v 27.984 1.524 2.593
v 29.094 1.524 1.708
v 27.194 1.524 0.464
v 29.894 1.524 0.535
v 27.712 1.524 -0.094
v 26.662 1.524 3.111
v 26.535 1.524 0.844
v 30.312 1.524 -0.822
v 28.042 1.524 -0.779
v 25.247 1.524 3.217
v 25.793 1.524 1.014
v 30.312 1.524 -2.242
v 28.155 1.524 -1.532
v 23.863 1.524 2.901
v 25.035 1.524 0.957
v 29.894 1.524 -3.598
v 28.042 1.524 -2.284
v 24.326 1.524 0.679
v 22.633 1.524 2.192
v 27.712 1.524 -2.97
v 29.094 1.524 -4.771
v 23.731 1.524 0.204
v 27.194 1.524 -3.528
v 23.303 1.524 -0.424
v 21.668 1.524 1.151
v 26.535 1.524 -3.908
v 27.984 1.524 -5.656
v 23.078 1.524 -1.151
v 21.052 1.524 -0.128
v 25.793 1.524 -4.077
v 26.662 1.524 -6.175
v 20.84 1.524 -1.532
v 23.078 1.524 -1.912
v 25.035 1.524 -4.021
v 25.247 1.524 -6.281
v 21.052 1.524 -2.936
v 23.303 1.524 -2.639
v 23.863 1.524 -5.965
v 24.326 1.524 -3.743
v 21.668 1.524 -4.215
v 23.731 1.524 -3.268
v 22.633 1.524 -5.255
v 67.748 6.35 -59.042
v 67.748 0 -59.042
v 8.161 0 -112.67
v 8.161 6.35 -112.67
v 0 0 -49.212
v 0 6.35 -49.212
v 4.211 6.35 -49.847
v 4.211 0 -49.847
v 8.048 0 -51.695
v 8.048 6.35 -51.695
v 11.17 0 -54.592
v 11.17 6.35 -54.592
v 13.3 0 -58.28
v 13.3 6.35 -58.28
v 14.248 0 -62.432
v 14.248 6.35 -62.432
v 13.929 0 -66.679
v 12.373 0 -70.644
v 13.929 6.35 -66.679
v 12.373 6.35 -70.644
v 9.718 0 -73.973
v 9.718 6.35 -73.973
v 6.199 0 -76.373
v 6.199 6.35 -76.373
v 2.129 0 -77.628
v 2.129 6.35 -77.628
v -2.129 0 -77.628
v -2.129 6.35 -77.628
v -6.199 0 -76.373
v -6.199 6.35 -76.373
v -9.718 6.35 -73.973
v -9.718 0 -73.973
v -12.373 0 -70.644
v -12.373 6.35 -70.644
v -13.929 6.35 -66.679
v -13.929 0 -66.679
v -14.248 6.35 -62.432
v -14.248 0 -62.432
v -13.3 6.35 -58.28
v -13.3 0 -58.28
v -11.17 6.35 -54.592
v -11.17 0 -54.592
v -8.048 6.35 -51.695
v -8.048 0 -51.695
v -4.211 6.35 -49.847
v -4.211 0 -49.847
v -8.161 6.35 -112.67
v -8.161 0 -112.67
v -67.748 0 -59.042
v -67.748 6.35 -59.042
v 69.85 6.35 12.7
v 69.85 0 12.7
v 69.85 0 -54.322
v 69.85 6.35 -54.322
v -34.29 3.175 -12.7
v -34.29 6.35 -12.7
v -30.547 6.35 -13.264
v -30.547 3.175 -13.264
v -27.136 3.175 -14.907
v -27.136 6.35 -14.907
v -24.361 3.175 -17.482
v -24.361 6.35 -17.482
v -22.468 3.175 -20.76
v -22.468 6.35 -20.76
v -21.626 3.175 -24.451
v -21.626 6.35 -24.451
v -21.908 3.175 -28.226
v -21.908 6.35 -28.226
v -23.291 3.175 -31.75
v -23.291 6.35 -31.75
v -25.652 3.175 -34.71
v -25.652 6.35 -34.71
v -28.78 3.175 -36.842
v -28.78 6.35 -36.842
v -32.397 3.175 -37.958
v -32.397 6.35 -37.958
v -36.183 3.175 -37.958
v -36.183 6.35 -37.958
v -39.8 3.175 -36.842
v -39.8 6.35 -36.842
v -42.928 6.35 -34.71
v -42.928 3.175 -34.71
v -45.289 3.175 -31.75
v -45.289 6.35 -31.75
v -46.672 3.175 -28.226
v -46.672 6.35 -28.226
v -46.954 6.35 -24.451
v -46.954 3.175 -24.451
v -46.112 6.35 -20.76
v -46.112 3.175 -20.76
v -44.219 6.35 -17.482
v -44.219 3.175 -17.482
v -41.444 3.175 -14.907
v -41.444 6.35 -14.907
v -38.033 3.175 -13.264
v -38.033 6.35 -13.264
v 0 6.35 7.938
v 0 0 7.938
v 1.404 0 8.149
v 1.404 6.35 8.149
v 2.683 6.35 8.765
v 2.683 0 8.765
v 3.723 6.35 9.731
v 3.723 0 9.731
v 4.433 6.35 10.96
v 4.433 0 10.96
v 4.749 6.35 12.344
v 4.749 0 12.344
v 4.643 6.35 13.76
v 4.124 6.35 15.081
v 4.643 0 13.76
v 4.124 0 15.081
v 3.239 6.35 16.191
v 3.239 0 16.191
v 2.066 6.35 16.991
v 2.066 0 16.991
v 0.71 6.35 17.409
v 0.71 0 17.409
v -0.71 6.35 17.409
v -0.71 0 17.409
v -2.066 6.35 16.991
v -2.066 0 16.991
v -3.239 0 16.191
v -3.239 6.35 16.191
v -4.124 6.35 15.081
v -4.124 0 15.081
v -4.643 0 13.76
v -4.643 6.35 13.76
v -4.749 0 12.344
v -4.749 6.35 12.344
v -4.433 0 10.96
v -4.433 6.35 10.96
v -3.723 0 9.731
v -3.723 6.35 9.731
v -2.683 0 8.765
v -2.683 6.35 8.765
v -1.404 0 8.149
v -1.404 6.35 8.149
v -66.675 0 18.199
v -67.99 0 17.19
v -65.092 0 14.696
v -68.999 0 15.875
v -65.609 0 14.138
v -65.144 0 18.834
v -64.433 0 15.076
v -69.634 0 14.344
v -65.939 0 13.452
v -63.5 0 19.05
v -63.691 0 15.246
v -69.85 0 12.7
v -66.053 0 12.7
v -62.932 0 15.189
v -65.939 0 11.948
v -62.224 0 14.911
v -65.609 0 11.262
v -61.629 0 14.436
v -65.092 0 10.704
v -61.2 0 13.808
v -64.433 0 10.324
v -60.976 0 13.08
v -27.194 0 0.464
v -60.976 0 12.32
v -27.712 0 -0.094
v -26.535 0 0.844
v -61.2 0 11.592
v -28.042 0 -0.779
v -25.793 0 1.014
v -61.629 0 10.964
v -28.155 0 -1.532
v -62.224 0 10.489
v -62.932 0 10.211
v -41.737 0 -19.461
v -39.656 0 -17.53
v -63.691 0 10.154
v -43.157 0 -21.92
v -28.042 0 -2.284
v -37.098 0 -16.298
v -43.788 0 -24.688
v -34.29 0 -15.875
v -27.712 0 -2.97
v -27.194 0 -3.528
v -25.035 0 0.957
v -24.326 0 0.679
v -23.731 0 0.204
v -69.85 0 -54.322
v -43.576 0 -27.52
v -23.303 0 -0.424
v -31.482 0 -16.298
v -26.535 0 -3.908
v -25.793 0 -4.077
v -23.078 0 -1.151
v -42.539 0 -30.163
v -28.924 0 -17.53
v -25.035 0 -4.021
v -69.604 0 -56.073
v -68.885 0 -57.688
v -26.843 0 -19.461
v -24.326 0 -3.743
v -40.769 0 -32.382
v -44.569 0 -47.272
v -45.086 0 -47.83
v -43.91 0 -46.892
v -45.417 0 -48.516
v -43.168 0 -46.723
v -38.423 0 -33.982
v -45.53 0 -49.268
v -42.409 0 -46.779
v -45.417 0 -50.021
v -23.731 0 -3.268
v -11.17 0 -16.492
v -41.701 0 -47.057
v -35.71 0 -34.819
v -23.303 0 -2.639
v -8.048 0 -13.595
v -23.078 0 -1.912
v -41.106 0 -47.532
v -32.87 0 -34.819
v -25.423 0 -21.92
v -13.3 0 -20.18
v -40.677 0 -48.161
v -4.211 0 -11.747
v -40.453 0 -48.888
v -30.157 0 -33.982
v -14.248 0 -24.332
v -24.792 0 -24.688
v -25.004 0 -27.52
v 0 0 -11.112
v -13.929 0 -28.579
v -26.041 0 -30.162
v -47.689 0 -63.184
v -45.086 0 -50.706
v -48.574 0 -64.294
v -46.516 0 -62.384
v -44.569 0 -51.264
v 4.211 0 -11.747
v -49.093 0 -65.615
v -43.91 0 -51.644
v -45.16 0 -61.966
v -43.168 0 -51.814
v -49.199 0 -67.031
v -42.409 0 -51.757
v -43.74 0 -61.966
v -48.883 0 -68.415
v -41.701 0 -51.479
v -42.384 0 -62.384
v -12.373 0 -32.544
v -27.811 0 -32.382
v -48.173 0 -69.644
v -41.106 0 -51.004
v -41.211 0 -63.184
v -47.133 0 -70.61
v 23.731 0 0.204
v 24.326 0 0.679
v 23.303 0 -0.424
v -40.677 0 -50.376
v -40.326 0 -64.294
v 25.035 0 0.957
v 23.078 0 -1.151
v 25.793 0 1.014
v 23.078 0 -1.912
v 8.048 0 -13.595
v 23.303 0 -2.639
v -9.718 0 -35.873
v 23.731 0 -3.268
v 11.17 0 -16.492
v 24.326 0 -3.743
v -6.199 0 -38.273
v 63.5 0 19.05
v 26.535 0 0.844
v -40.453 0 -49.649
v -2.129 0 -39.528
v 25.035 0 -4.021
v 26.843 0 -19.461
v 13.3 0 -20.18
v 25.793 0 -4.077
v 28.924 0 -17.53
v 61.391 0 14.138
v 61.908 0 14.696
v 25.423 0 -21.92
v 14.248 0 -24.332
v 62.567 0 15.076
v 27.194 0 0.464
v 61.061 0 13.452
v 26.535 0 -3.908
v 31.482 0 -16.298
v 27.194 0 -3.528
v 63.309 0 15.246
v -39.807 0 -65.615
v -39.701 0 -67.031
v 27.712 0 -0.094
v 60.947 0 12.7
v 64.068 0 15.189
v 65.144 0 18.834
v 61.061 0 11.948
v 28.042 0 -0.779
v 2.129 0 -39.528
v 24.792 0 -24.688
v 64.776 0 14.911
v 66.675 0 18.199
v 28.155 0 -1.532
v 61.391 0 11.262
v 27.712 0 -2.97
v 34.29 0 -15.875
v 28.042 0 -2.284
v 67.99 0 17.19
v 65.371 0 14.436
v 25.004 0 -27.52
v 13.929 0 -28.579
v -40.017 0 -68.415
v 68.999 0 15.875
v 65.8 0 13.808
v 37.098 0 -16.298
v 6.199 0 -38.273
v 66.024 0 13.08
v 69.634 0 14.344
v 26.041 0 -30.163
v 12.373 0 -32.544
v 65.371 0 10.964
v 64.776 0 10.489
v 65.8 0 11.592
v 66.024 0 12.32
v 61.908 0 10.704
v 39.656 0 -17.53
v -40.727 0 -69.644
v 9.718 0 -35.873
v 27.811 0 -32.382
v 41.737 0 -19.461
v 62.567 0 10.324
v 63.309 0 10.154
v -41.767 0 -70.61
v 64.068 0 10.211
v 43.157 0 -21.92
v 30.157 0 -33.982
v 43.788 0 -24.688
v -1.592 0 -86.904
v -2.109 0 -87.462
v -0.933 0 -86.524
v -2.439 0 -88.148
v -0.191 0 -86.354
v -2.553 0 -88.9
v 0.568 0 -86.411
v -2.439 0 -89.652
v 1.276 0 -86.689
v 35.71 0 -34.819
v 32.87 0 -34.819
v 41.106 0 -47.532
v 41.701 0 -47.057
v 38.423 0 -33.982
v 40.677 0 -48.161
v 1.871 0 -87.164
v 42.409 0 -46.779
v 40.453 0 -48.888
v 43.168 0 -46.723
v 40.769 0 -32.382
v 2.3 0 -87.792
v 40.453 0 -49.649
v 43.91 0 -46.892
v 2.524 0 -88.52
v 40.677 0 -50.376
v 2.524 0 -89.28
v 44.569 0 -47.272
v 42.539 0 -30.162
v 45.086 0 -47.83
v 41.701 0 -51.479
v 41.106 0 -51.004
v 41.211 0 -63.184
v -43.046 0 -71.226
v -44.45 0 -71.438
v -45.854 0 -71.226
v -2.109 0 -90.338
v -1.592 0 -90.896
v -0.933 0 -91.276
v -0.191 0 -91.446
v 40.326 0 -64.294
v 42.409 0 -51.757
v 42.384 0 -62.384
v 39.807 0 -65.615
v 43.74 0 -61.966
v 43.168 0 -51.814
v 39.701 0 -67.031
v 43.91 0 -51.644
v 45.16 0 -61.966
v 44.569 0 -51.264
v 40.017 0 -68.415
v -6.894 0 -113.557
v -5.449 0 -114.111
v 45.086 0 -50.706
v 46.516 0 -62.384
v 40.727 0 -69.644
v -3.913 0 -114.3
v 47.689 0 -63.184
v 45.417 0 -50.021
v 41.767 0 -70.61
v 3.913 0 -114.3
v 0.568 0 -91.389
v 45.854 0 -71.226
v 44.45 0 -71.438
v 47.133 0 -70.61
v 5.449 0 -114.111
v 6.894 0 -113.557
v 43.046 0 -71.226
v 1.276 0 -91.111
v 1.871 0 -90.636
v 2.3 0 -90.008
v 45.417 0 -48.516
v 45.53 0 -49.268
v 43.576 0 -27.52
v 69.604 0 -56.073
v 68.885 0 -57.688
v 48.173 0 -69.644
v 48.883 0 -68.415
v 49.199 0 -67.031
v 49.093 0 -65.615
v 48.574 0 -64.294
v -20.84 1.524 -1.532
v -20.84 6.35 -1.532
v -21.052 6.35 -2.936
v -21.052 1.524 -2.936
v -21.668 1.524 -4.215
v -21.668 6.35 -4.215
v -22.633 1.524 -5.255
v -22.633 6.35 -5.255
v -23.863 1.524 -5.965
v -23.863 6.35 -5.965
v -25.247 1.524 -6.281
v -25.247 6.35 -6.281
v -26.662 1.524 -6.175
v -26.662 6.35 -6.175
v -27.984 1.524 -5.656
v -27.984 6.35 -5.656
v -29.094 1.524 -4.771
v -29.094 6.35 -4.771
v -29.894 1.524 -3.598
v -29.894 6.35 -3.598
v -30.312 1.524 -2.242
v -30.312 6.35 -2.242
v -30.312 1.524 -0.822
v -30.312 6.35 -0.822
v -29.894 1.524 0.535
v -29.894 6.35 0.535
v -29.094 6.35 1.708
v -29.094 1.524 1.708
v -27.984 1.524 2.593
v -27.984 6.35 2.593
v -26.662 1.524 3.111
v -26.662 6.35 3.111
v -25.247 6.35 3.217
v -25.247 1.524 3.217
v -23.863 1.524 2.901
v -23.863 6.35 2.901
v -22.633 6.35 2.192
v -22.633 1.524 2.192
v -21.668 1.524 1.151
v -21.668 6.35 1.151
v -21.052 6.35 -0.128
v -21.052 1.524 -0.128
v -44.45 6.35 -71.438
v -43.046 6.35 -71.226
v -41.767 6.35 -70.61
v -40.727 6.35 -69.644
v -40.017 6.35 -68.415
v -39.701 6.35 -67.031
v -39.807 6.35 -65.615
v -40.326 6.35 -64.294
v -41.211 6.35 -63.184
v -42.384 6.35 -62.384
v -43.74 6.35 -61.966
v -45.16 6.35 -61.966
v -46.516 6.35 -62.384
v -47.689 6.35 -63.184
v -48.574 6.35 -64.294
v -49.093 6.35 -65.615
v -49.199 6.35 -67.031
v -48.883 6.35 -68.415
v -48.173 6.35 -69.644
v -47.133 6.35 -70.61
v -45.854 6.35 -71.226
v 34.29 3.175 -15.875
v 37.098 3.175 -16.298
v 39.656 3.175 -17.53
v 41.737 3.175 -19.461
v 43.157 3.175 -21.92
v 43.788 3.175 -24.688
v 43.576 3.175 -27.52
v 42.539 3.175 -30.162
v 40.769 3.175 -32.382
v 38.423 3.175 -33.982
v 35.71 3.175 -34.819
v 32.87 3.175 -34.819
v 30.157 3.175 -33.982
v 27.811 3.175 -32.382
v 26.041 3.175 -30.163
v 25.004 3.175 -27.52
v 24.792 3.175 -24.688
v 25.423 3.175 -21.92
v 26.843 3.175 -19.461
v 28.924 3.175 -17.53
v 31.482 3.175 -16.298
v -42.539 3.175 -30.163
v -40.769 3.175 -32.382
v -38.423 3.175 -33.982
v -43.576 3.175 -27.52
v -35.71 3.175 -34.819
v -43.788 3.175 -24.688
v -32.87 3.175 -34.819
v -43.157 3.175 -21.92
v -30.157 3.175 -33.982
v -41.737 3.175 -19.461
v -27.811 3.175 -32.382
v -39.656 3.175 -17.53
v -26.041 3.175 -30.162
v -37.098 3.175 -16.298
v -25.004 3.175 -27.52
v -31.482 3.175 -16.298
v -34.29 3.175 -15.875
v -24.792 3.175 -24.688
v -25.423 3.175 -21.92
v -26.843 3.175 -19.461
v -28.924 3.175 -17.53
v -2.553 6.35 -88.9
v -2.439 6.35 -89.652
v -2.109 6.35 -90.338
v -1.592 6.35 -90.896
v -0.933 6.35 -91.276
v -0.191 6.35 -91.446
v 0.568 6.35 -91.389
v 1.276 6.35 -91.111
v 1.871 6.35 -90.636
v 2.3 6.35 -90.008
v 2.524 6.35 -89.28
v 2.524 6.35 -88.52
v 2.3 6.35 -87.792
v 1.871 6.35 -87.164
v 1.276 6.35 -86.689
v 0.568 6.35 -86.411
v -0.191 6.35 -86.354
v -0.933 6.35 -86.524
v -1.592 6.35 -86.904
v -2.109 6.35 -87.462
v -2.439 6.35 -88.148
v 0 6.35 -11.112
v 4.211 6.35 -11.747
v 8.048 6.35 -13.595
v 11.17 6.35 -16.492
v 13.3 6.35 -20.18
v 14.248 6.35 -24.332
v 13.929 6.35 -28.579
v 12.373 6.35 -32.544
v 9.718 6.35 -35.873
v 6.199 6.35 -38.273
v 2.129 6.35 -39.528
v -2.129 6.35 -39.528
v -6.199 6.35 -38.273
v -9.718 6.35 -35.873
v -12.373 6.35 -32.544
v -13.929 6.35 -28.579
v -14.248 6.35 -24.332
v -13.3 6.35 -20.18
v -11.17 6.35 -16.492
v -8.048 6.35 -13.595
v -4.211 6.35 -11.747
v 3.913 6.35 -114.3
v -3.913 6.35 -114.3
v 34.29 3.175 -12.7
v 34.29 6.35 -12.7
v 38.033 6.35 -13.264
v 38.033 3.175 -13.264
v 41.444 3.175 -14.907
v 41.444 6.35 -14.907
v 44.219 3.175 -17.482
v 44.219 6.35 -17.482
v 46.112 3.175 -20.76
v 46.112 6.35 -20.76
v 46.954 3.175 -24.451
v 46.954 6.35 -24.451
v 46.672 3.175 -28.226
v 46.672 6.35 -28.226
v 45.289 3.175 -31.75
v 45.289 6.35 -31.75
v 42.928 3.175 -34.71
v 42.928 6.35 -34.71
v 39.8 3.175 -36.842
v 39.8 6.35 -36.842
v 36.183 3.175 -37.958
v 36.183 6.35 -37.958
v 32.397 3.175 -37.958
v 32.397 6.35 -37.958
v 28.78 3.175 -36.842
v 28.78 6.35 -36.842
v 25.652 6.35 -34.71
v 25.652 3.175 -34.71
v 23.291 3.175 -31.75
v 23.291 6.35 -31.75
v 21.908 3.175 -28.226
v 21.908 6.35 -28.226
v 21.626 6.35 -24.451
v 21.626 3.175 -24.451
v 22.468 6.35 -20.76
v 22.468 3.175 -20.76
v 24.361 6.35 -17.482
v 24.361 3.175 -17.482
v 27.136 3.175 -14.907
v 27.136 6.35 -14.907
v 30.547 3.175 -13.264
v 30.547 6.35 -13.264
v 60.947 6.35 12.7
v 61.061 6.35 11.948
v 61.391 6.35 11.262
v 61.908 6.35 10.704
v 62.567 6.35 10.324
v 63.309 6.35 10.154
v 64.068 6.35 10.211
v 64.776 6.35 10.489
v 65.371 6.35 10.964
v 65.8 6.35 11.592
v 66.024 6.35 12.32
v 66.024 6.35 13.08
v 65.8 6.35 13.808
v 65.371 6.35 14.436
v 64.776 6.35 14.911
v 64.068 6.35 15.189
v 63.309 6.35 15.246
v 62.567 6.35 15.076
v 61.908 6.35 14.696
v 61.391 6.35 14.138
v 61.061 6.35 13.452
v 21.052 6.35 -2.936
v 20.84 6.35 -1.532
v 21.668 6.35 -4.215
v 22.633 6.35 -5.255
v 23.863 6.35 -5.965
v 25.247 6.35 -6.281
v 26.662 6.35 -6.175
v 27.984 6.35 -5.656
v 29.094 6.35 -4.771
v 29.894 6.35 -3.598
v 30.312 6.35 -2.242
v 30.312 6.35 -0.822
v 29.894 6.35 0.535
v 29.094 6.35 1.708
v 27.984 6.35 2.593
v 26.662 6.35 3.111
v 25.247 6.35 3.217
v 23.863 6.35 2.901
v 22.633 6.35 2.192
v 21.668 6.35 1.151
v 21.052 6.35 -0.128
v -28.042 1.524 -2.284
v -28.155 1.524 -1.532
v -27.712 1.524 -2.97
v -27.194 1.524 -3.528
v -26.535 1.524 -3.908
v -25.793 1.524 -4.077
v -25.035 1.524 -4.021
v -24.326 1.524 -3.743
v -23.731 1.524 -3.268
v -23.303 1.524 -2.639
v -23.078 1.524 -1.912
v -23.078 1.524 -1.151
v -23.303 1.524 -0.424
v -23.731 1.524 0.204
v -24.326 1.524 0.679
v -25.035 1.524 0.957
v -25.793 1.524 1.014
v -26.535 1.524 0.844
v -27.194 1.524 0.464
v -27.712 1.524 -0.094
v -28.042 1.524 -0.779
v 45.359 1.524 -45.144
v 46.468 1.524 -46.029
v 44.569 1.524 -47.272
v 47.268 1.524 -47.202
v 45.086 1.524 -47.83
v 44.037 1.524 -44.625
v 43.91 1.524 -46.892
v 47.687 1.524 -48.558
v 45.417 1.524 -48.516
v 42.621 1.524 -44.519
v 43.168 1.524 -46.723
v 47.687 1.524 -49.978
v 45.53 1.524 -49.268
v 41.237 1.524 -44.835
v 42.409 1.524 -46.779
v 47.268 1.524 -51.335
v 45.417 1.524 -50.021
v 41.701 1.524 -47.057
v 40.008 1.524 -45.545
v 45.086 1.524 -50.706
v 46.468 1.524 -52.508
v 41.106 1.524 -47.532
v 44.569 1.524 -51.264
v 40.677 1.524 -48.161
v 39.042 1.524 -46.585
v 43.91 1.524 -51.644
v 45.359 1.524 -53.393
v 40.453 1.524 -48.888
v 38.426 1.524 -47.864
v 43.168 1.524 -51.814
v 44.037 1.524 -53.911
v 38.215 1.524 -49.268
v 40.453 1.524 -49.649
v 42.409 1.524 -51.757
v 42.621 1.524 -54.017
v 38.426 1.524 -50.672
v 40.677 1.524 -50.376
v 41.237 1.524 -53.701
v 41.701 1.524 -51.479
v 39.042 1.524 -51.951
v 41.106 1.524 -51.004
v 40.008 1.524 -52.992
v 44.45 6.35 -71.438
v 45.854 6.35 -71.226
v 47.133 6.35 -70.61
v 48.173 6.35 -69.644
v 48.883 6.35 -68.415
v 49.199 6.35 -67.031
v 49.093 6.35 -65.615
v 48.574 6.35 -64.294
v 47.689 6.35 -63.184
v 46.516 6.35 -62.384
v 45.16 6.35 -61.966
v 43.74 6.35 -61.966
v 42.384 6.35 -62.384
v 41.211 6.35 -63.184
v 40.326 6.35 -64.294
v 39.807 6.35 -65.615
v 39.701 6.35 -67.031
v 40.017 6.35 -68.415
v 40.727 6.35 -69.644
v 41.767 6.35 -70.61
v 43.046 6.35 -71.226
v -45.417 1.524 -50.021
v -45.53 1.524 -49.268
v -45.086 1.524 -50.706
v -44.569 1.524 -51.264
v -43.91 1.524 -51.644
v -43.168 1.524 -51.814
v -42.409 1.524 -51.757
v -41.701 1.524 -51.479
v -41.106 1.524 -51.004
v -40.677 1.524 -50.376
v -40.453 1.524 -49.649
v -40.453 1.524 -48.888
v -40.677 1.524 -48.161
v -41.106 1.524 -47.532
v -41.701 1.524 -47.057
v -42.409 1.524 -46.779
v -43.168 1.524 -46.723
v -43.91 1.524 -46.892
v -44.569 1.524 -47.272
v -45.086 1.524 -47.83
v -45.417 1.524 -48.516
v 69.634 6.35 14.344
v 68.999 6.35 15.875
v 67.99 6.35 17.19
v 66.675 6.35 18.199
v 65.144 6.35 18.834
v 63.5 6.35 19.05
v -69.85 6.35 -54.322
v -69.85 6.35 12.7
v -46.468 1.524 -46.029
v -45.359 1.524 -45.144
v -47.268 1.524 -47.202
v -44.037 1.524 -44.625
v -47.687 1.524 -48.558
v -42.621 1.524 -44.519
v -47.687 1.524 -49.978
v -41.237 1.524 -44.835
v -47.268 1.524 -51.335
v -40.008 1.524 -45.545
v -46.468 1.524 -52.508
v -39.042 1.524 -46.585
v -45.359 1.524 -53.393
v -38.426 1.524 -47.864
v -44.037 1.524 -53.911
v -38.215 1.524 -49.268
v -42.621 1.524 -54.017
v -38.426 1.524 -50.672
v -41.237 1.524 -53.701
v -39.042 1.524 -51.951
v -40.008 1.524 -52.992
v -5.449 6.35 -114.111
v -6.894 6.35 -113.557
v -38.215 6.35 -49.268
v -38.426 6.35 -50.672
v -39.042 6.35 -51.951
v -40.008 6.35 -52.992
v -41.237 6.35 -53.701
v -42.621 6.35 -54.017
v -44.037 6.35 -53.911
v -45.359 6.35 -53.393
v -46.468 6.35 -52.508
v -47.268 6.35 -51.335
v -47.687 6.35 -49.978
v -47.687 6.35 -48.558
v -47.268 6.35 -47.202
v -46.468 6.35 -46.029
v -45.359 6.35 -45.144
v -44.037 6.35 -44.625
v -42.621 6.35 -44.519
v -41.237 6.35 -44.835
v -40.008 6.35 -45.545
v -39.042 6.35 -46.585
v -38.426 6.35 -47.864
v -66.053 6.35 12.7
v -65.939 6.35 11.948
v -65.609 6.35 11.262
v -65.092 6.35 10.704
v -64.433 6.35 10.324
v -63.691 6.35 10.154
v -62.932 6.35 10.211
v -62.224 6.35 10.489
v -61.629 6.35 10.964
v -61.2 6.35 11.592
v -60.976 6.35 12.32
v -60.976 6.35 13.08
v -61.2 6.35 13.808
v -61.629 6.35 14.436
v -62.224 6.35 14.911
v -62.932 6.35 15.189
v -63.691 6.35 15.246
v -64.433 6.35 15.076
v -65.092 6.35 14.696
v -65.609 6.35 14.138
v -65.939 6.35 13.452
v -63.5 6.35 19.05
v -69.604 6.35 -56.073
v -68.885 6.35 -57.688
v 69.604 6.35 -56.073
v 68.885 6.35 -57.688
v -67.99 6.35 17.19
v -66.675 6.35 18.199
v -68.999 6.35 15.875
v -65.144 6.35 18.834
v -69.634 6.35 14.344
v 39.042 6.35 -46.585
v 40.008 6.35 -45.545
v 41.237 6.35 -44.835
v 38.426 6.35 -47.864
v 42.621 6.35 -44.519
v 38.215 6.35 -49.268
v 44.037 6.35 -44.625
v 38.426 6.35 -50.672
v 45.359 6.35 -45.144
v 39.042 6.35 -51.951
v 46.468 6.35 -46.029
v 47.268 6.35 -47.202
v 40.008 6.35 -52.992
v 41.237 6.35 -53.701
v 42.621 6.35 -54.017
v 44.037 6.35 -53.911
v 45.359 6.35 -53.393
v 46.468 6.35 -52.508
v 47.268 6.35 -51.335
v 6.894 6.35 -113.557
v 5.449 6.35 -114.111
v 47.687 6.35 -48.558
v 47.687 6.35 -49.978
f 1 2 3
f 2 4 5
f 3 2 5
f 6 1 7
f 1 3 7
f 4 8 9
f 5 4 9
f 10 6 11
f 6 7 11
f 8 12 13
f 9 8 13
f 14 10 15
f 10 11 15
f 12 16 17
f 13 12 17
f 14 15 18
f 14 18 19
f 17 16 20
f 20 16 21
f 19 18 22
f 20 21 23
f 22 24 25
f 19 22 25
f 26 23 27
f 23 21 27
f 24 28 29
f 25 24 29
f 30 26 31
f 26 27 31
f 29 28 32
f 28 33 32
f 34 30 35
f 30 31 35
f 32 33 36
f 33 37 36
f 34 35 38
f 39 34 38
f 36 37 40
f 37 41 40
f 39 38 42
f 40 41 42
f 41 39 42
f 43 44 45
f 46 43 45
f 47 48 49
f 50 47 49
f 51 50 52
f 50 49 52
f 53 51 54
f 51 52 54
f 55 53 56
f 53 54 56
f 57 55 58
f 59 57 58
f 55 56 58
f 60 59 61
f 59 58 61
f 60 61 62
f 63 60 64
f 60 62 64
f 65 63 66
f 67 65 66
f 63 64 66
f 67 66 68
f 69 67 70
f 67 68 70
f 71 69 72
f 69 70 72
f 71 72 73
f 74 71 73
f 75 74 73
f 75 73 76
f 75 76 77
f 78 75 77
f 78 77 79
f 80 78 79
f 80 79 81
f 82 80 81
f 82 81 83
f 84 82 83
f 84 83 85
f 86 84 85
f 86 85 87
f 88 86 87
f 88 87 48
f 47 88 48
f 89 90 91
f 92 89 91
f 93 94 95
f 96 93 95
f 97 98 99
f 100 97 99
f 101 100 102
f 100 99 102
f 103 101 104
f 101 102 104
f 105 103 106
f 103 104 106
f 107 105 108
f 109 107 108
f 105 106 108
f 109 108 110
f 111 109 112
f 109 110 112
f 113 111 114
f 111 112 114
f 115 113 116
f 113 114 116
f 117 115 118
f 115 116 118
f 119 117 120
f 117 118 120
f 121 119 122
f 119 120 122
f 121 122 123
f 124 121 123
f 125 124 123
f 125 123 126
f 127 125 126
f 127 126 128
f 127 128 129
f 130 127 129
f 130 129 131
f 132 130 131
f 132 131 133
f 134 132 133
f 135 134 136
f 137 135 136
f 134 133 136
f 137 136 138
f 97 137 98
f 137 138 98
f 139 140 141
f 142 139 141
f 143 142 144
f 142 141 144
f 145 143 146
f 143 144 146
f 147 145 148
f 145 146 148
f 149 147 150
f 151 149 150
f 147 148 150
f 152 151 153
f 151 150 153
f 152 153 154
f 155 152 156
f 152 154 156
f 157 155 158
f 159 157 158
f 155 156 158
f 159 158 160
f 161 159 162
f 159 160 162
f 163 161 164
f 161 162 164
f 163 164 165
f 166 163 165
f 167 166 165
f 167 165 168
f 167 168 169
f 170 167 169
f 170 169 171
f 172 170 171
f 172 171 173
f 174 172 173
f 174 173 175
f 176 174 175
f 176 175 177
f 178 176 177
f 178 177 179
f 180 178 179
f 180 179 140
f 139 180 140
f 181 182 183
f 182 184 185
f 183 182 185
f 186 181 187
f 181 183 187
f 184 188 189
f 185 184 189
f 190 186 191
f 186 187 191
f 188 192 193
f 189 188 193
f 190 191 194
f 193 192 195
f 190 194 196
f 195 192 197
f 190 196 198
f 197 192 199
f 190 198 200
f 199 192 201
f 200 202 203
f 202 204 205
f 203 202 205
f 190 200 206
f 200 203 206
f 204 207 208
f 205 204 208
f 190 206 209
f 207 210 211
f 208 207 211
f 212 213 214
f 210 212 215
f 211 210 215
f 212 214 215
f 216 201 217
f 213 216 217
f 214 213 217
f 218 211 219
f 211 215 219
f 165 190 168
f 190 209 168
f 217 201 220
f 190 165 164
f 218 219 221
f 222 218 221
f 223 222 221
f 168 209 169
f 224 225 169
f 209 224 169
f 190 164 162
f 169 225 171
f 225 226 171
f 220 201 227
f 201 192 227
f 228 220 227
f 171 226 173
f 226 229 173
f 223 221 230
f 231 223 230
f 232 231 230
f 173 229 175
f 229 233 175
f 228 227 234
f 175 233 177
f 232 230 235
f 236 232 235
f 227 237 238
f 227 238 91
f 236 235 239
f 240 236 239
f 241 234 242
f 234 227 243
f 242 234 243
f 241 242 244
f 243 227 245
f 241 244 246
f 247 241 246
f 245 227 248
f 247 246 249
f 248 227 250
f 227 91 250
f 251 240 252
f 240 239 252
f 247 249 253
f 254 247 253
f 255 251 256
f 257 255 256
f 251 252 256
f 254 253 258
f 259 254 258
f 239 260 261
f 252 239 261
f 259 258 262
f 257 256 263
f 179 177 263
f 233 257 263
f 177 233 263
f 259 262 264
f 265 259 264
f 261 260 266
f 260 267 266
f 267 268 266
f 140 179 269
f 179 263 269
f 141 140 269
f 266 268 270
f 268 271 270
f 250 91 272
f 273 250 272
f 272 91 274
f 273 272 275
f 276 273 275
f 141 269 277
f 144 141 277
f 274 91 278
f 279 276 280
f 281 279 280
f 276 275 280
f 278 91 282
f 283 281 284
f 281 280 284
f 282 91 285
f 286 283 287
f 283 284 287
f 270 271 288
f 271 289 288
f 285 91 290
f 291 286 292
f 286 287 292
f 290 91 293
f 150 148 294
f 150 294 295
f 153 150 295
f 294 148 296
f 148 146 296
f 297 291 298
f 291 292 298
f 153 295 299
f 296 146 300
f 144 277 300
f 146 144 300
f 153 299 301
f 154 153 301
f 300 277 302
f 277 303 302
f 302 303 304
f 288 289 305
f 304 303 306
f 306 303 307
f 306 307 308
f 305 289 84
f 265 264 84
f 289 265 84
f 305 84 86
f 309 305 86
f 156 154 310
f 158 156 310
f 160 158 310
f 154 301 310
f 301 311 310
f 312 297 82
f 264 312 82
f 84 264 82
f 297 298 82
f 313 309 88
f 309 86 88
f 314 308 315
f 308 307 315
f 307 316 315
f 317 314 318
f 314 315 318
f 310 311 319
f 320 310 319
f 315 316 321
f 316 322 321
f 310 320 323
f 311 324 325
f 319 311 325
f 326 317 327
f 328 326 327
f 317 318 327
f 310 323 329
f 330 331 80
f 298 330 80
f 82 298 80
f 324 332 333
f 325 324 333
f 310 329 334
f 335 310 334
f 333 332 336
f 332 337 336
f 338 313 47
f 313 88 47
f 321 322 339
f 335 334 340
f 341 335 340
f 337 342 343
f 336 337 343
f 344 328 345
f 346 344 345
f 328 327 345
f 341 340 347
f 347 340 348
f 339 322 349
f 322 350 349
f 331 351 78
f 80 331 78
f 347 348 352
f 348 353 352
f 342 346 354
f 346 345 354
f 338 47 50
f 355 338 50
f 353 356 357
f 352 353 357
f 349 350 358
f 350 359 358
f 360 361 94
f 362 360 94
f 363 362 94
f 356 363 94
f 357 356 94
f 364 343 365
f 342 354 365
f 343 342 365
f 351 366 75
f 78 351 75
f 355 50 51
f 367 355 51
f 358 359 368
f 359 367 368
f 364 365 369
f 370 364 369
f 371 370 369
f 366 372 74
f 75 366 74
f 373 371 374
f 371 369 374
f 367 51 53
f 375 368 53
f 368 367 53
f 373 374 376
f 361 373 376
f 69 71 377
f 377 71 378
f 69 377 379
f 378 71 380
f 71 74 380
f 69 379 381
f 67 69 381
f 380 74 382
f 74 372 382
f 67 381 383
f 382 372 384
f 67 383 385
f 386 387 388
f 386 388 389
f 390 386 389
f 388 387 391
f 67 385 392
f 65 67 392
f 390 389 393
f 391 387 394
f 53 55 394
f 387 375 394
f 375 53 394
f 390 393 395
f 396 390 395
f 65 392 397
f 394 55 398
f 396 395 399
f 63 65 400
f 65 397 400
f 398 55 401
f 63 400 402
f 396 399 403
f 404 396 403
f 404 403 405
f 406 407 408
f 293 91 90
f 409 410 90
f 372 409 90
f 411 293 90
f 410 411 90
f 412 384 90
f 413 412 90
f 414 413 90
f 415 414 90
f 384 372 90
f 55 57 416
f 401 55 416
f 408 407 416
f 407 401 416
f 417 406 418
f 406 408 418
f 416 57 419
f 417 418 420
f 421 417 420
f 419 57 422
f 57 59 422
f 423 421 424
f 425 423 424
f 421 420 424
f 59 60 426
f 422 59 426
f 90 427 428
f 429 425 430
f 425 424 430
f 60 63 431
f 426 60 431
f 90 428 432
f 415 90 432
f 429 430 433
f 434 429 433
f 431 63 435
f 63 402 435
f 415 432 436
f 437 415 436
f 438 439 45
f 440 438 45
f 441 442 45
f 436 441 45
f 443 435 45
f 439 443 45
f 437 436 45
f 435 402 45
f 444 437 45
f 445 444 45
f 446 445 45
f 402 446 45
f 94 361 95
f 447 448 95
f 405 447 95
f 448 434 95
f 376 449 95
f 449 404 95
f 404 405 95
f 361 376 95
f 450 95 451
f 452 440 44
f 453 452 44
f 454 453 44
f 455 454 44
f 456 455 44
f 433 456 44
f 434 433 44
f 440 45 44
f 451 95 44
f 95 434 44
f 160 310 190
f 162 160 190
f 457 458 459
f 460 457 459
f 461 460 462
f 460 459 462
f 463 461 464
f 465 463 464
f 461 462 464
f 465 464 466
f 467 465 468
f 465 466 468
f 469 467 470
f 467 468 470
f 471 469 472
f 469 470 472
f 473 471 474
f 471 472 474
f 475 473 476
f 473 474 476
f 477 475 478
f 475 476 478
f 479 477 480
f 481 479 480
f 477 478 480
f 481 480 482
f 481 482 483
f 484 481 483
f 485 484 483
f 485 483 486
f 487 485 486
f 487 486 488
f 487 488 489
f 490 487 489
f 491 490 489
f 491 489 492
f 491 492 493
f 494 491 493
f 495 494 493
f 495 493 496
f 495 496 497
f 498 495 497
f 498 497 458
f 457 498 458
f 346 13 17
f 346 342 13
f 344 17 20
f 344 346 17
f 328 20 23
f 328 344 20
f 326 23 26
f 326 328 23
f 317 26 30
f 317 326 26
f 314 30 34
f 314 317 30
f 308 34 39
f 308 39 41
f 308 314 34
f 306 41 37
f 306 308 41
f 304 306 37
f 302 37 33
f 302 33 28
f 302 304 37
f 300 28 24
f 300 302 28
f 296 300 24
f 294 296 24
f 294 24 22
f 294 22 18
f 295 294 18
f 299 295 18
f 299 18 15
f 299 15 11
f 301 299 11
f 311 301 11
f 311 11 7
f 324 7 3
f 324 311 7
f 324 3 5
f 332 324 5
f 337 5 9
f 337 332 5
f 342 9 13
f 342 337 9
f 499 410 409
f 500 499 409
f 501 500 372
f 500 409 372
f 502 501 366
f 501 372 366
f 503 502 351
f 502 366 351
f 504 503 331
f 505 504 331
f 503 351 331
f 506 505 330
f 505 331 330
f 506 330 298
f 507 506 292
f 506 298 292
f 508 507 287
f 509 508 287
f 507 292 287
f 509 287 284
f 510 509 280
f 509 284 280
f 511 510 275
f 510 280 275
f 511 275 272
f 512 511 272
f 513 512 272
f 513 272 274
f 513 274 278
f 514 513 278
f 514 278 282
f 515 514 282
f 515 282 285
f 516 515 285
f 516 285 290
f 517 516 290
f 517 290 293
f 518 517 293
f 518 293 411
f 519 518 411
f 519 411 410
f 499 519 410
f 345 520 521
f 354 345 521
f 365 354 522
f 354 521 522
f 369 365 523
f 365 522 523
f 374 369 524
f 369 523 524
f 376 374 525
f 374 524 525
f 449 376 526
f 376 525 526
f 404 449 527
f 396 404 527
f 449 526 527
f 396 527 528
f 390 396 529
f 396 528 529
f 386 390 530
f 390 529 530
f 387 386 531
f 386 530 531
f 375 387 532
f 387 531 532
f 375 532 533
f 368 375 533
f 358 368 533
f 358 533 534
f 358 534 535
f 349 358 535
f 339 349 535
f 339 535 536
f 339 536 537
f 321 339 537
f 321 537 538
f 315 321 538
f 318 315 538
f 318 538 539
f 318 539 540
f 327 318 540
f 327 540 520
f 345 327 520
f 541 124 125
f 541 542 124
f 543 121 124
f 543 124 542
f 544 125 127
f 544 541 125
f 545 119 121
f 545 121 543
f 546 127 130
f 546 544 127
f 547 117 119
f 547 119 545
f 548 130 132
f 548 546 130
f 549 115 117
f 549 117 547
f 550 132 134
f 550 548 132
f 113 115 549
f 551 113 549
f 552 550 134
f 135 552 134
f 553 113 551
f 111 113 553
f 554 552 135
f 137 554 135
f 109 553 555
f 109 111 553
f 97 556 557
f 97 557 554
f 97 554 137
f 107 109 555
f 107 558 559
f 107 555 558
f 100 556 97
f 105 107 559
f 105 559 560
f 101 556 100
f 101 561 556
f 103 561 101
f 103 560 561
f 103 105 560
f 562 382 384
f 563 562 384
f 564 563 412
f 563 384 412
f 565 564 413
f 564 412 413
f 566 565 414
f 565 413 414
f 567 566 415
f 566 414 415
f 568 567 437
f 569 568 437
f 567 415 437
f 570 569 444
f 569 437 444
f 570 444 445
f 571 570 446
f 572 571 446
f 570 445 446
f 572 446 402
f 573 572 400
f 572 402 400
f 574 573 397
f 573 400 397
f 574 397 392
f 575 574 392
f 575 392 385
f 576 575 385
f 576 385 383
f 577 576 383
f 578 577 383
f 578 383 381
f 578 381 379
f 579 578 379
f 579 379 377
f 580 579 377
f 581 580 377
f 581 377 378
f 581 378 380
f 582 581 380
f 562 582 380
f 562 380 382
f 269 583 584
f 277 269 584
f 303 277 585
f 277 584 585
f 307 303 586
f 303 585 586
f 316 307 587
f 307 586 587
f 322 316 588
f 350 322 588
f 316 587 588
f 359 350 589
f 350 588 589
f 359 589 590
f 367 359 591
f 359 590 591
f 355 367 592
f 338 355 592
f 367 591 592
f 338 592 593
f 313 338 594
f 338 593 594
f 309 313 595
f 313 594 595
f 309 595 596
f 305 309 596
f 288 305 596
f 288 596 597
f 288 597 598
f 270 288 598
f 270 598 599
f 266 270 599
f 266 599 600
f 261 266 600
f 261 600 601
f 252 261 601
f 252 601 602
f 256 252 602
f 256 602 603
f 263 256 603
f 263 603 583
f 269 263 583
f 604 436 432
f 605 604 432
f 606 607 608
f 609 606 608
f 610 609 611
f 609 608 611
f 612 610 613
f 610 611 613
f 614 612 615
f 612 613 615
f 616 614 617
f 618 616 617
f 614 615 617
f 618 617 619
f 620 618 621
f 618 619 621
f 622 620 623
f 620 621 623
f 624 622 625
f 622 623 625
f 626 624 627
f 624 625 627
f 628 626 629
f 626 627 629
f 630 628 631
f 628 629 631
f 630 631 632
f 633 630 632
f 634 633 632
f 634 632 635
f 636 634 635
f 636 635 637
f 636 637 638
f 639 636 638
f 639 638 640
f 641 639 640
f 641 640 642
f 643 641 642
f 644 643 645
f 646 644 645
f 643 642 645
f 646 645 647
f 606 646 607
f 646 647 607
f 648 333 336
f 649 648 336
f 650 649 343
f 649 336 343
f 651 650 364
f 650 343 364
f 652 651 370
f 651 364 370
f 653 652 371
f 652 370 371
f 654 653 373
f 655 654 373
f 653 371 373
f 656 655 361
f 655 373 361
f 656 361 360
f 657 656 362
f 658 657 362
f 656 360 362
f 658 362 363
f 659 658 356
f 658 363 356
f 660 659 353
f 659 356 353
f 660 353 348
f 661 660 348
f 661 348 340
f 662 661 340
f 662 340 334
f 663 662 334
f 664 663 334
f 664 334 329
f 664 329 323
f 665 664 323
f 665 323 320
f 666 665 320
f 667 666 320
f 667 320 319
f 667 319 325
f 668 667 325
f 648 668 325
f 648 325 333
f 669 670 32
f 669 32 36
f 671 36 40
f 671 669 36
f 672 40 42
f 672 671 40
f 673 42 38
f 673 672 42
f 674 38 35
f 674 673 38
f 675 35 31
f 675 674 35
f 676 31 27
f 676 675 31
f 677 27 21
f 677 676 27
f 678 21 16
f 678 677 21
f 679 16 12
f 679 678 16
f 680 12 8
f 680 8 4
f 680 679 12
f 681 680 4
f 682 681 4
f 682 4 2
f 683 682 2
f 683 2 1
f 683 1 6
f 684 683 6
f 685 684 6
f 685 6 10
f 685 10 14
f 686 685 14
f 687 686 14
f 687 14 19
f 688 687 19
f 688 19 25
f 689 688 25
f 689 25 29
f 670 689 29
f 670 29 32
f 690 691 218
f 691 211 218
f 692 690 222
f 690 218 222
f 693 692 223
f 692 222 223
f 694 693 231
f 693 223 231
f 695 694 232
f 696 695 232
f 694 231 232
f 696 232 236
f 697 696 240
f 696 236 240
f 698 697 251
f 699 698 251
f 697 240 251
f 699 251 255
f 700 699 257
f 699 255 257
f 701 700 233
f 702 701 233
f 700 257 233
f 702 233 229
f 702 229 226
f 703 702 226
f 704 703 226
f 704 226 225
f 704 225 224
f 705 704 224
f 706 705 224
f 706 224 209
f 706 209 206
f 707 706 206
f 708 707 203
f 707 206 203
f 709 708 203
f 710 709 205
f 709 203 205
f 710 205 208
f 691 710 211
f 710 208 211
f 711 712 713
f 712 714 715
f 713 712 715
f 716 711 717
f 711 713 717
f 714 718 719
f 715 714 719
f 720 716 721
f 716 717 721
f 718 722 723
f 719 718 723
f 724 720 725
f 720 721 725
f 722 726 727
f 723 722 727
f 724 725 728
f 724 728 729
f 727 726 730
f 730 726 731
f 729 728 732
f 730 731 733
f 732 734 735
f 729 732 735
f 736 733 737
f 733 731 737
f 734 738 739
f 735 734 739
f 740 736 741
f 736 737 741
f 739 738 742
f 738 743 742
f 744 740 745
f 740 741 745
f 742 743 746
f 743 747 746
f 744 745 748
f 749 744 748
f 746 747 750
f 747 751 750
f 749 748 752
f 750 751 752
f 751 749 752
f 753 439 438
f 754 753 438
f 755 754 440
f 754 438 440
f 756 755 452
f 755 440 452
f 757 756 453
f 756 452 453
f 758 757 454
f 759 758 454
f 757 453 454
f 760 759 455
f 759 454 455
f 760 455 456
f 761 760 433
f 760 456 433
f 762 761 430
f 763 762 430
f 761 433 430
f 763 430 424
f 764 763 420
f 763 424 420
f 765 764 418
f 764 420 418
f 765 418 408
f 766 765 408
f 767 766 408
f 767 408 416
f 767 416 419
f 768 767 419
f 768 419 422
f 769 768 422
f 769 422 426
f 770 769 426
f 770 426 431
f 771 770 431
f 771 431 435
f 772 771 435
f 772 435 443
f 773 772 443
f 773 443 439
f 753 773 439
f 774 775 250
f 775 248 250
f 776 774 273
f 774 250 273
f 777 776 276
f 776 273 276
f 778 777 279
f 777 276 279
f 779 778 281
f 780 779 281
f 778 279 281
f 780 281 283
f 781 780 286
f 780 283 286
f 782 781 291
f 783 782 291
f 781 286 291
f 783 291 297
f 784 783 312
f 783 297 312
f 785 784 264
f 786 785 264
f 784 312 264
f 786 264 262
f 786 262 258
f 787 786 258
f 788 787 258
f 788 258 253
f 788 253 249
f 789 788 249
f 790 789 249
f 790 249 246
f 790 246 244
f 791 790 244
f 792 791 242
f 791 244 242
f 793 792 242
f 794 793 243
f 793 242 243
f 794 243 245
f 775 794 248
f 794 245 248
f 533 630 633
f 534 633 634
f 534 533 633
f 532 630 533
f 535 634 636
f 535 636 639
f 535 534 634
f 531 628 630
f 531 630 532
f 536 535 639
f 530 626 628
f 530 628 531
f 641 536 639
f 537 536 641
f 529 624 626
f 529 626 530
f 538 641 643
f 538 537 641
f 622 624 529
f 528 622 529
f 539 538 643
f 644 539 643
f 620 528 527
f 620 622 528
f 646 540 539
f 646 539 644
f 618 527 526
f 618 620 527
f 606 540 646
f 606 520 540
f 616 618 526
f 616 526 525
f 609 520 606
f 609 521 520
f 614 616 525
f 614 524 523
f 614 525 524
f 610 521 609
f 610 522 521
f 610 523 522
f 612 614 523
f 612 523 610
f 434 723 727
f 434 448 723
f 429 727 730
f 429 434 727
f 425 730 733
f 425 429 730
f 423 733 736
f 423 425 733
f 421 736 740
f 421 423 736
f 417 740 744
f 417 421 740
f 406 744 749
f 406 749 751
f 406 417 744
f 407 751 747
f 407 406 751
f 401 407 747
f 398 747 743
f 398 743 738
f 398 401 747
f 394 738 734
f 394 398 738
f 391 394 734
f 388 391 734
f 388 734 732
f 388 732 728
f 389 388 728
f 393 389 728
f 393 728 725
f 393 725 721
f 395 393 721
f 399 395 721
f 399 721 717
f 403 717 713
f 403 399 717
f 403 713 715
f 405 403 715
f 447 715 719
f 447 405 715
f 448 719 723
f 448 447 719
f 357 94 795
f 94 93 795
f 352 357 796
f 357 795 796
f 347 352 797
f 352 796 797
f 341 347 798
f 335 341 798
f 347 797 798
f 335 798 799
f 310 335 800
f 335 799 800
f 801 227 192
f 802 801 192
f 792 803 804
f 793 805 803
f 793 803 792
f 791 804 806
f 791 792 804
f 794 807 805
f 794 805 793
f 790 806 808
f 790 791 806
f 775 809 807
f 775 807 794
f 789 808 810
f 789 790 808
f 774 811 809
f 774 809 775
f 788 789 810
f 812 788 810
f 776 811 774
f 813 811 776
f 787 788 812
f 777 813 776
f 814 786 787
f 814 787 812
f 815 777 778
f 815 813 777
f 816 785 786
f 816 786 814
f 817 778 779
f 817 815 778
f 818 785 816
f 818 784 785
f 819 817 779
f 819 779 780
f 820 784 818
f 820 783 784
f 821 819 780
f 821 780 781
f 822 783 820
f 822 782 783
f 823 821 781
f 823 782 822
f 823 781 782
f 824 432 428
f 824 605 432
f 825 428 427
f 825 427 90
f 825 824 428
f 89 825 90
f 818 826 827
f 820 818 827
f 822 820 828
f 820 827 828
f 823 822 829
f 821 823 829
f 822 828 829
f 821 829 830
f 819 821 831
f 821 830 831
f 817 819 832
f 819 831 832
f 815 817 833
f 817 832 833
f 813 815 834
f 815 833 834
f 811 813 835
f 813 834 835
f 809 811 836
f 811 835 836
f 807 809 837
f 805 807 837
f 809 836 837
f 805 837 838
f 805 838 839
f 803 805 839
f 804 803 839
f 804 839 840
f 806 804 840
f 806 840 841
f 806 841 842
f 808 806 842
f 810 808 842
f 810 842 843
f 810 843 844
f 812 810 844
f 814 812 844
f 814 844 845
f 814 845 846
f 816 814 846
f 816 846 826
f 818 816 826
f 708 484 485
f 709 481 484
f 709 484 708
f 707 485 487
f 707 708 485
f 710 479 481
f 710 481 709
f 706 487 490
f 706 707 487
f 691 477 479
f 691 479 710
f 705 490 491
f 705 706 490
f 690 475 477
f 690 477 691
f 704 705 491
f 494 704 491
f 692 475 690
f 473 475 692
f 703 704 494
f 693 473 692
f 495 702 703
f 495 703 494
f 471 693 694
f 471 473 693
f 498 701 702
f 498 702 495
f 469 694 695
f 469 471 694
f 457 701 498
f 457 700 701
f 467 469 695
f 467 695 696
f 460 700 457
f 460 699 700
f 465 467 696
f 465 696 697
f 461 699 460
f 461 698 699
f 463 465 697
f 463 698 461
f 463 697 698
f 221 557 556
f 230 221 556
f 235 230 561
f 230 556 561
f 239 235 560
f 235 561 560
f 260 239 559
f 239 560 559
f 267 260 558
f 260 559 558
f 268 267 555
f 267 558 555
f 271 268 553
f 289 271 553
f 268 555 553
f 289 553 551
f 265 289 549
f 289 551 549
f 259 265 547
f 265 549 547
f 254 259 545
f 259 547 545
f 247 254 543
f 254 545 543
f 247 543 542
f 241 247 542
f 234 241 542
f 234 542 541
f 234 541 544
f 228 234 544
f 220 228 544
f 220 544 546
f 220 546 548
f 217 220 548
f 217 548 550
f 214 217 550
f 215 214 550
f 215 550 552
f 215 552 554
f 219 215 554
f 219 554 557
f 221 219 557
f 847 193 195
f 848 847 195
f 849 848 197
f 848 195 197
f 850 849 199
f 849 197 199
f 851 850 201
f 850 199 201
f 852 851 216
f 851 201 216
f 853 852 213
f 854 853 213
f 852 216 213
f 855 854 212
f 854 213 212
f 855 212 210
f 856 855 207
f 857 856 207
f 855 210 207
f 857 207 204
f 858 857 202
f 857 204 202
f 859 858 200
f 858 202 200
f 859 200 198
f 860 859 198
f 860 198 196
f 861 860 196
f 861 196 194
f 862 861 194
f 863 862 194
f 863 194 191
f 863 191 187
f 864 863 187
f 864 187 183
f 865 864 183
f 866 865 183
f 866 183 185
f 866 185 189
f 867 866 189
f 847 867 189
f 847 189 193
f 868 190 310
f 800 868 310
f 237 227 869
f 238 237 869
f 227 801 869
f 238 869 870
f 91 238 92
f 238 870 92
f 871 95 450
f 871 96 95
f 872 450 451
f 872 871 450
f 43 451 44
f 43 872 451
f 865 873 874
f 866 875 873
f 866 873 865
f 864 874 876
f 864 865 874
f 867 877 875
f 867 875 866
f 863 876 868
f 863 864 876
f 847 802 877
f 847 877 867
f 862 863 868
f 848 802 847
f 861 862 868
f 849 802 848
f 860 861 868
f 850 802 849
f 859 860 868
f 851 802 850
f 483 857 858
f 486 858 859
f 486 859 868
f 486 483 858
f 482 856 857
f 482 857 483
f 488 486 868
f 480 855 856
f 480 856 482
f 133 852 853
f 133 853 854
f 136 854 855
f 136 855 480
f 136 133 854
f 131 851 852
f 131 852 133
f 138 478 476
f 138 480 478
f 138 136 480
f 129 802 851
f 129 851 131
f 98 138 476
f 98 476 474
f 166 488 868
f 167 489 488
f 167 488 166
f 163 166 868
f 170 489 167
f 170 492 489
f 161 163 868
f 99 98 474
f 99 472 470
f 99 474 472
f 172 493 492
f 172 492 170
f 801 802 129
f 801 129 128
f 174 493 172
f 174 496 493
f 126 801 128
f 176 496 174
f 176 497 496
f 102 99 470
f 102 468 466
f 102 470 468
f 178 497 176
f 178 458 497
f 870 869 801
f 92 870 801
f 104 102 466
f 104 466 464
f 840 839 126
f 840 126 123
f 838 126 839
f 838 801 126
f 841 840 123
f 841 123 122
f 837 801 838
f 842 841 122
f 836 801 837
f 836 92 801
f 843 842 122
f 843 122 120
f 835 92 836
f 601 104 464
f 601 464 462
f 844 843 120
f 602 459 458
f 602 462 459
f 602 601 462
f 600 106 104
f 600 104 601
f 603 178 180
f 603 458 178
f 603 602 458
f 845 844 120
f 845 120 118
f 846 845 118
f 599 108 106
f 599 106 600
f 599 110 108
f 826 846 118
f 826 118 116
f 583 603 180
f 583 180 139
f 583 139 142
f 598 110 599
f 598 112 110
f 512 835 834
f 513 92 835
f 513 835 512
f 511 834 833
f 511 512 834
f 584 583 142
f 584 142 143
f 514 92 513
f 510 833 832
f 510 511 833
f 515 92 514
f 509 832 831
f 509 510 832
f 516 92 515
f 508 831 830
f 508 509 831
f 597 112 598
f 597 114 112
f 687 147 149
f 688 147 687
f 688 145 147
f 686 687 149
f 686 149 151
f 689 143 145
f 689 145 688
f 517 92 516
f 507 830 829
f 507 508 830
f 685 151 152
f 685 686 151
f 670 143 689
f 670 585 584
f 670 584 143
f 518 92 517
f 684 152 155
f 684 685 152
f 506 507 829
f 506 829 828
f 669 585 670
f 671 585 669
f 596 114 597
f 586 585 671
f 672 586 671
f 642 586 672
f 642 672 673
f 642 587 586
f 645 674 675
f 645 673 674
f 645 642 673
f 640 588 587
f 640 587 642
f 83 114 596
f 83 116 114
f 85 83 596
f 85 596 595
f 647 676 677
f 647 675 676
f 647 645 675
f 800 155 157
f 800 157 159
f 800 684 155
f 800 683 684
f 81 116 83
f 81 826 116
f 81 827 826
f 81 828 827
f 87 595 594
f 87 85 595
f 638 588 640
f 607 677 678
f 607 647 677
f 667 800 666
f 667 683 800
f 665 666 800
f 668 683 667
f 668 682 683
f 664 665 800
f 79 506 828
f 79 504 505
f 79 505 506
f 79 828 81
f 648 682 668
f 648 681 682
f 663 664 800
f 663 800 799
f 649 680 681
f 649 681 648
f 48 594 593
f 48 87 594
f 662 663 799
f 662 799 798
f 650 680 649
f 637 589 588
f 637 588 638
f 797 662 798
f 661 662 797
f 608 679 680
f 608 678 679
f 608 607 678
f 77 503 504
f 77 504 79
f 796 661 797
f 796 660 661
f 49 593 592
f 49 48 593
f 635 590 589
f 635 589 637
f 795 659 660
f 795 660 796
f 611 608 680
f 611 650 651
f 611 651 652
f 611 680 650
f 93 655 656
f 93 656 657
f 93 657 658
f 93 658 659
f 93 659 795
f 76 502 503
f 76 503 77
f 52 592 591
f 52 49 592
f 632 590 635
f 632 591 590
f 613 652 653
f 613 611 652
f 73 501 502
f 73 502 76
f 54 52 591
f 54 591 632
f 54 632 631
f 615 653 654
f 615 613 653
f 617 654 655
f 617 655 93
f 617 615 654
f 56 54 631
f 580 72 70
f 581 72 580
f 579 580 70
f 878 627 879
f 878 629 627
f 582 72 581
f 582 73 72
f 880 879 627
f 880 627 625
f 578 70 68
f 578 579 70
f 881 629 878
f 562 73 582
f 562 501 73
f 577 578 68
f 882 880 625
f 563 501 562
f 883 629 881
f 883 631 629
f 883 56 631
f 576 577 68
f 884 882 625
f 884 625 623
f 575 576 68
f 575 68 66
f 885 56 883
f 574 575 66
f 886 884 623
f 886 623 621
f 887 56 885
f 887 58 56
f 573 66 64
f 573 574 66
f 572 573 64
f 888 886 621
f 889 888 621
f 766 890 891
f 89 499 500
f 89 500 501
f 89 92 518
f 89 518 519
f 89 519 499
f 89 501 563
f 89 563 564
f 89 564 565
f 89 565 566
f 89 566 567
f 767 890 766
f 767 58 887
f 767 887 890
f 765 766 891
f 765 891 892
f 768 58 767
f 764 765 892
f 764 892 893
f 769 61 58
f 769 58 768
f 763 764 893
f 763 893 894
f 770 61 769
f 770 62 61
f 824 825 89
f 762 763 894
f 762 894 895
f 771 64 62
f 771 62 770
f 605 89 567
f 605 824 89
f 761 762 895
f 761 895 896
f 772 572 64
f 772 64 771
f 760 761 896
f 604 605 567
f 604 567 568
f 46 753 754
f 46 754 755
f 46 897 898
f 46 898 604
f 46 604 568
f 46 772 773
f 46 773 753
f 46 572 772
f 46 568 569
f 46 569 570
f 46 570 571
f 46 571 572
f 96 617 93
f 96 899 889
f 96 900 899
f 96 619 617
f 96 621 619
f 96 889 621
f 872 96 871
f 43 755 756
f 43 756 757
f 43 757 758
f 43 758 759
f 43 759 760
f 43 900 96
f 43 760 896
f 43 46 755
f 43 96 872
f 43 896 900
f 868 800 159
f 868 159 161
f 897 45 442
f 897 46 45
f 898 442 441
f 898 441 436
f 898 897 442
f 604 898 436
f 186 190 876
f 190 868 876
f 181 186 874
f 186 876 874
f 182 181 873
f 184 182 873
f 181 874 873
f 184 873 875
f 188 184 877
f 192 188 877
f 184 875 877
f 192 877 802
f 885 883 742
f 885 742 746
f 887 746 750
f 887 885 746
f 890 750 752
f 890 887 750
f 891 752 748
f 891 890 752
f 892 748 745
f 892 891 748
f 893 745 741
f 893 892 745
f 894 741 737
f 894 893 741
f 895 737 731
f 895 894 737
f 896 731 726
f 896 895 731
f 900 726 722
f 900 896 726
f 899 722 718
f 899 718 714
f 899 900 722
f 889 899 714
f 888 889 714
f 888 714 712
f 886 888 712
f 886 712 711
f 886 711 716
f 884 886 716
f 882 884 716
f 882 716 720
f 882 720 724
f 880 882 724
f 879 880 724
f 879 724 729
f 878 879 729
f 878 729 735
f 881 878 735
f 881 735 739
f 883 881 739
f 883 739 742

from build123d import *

# Parameters (mm, degrees)
BOSS_EXTRUDE1_DEPTH                             = 6.35
SKETCH2_R                                       = 9.525
MOTOR_SHAFT_HOLES_DEPTH                         = 135.10382172
SKETCH3_R                                       = 14.2875
FIRST_BEARING_HOLE_DEPTH                        = 135.10382172
SKETCH4_R                                       = 12.7
PINION_CLEARANCE_DEPTH                          = 3.175
SKETCH5_R                                       = 14.2875
CUT_EXTRUDE1_DEPTH                              = 135.10382172
CBORE_FOR_10_SOCKET_HEAD_CAP_SCREW1_D           = 5.1054
CBORE_FOR_10_SOCKET_HEAD_CAP_SCREW1_CBORE_D     = 9.525
CBORE_FOR_10_SOCKET_HEAD_CAP_SCREW1_CBORE_DEPTH = 4.826
F_10_CLEARANCE_HOLE1_D                          = 5.1054
FILLET1_R                                       = 6.35
SKETCH11_R                                      = 4.7625
CUT_EXTRUDE2_DEPTH                              = 50.8


with BuildPart() as part:
    # Sketch1 → Boss-Extrude1 (new body)
    with BuildSketch(Plane(origin=(0, 0, 0), x_dir=(1, 0, 0), z_dir=(0, 1, 0))):
        Polygon((69.85, -19.05), (69.85, 57.15), (6.35, 114.3), (-6.35, 114.3), (-69.85, 57.15), (-69.85, -19.05), align=None)
    extrude(amount=BOSS_EXTRUDE1_DEPTH)

    # Sketch2 → Motor Shaft Holes (cut, through all)
    with BuildSketch(Plane(origin=(0, 6.35, 0), x_dir=(1, 0, 0), z_dir=(0, 1, 0))):
        with Locations(Location((-34.29, 25.4, 0), (0, 0, 270))):
            Circle(SKETCH2_R)
        with Locations(Location((34.29, 25.4, 0), (0, 0, 270))):
            Circle(SKETCH2_R)
    extrude(amount=-MOTOR_SHAFT_HOLES_DEPTH, mode=Mode.SUBTRACT)

    # Sketch3 → First Bearing Hole (cut, through all)
    with BuildSketch(Plane(origin=(0, 6.35, 0), x_dir=(1, 0, 0), z_dir=(0, 1, 0))):
        with Locations(Location((0, 25.4, 0), (0, 0, 270))):
            Circle(SKETCH3_R)
    extrude(amount=-FIRST_BEARING_HOLE_DEPTH, mode=Mode.SUBTRACT)

    # Sketch4 → Pinion Clearance (cut)
    with BuildSketch(Plane(origin=(0, 6.35, 0), x_dir=(1, 0, 0), z_dir=(0, 1, 0))):
        with Locations(Location((-34.29, 25.4, 0), (0, 0, 270))):
            Circle(SKETCH4_R)
        with Locations(Location((34.29, 25.4, 0), (0, 0, 270))):
            Circle(SKETCH4_R)
    extrude(amount=-PINION_CLEARANCE_DEPTH, mode=Mode.SUBTRACT)

    # Sketch5 → Cut-Extrude1 (cut, through all)
    with BuildSketch(Plane(origin=(0, 6.35, 0), x_dir=(1, 0, 0), z_dir=(0, 1, 0))):
        with Locations(Location((0, 63.5, 0), (0, 0, 270))):
            Circle(SKETCH5_R)
    extrude(amount=-CUT_EXTRUDE1_DEPTH, mode=Mode.SUBTRACT)

    # CBORE for #10 Socket Head Cap Screw1 (through all)
    with Locations(Plane(origin=(0, 6.35, 0), x_dir=(1, 0, 0), z_dir=(0, 1, 0))):
        with Locations((-42.97731164, 49.268192568), (-25.60268836, 1.531807432)):
            cbore_for_10_socket_head_cap_screw1 = CounterBoreHole(CBORE_FOR_10_SOCKET_HEAD_CAP_SCREW1_D / 2, CBORE_FOR_10_SOCKET_HEAD_CAP_SCREW1_CBORE_D / 2, CBORE_FOR_10_SOCKET_HEAD_CAP_SCREW1_CBORE_DEPTH)

    # Mirror1: CBORE for #10 Socket Head Cap Screw1 across plane
    add(cbore_for_10_socket_head_cap_screw1.mirror(Plane(origin=(0, 0, 0), x_dir=(0, 0, 1), z_dir=(1, 0, 0))), mode=Mode.SUBTRACT)

    # #10 Clearance Hole1 (through all)
    with Locations(Plane(origin=(0, 34.925, 19.05), x_dir=(1, 0, 0), z_dir=(0, 1, 0))):
        with Locations((-63.5, 6.35), (63.5, 6.35), (0, 107.95)):
            Hole(F_10_CLEARANCE_HOLE1_D / 2)

    # Fillet1
    fillet1_edges = [part.edges().sort_by_distance(p)[0] for p in [
        (69.85, 3.175, -57.15),
        (69.85, 3.175, 19.05),
        (-69.85, 3.175, 19.05),
        (-69.85, 3.175, -57.15),
        (-6.35, 3.175, -114.3),
        (6.35, 3.175, -114.3),
    ]]
    fillet(fillet1_edges, radius=FILLET1_R)

    # Sketch11 → Cut-Extrude2 (cut)
    with BuildSketch(Plane(origin=(0, 0, 19.05), x_dir=(-1, 0, 0), z_dir=(0, -1, 0))):
        with Locations(Location((-44.45, 85.725, 0), (0, 0, 90))):
            Circle(SKETCH11_R)
        with Locations(Location((44.45, 85.725, 0), (0, 0, 90))):
            Circle(SKETCH11_R)
        with Locations(Location((0, 6.35, 0), (0, 0, 90))):
            Circle(SKETCH11_R)
    extrude(amount=-CUT_EXTRUDE2_DEPTH, mode=Mode.SUBTRACT)


solid = part.part
